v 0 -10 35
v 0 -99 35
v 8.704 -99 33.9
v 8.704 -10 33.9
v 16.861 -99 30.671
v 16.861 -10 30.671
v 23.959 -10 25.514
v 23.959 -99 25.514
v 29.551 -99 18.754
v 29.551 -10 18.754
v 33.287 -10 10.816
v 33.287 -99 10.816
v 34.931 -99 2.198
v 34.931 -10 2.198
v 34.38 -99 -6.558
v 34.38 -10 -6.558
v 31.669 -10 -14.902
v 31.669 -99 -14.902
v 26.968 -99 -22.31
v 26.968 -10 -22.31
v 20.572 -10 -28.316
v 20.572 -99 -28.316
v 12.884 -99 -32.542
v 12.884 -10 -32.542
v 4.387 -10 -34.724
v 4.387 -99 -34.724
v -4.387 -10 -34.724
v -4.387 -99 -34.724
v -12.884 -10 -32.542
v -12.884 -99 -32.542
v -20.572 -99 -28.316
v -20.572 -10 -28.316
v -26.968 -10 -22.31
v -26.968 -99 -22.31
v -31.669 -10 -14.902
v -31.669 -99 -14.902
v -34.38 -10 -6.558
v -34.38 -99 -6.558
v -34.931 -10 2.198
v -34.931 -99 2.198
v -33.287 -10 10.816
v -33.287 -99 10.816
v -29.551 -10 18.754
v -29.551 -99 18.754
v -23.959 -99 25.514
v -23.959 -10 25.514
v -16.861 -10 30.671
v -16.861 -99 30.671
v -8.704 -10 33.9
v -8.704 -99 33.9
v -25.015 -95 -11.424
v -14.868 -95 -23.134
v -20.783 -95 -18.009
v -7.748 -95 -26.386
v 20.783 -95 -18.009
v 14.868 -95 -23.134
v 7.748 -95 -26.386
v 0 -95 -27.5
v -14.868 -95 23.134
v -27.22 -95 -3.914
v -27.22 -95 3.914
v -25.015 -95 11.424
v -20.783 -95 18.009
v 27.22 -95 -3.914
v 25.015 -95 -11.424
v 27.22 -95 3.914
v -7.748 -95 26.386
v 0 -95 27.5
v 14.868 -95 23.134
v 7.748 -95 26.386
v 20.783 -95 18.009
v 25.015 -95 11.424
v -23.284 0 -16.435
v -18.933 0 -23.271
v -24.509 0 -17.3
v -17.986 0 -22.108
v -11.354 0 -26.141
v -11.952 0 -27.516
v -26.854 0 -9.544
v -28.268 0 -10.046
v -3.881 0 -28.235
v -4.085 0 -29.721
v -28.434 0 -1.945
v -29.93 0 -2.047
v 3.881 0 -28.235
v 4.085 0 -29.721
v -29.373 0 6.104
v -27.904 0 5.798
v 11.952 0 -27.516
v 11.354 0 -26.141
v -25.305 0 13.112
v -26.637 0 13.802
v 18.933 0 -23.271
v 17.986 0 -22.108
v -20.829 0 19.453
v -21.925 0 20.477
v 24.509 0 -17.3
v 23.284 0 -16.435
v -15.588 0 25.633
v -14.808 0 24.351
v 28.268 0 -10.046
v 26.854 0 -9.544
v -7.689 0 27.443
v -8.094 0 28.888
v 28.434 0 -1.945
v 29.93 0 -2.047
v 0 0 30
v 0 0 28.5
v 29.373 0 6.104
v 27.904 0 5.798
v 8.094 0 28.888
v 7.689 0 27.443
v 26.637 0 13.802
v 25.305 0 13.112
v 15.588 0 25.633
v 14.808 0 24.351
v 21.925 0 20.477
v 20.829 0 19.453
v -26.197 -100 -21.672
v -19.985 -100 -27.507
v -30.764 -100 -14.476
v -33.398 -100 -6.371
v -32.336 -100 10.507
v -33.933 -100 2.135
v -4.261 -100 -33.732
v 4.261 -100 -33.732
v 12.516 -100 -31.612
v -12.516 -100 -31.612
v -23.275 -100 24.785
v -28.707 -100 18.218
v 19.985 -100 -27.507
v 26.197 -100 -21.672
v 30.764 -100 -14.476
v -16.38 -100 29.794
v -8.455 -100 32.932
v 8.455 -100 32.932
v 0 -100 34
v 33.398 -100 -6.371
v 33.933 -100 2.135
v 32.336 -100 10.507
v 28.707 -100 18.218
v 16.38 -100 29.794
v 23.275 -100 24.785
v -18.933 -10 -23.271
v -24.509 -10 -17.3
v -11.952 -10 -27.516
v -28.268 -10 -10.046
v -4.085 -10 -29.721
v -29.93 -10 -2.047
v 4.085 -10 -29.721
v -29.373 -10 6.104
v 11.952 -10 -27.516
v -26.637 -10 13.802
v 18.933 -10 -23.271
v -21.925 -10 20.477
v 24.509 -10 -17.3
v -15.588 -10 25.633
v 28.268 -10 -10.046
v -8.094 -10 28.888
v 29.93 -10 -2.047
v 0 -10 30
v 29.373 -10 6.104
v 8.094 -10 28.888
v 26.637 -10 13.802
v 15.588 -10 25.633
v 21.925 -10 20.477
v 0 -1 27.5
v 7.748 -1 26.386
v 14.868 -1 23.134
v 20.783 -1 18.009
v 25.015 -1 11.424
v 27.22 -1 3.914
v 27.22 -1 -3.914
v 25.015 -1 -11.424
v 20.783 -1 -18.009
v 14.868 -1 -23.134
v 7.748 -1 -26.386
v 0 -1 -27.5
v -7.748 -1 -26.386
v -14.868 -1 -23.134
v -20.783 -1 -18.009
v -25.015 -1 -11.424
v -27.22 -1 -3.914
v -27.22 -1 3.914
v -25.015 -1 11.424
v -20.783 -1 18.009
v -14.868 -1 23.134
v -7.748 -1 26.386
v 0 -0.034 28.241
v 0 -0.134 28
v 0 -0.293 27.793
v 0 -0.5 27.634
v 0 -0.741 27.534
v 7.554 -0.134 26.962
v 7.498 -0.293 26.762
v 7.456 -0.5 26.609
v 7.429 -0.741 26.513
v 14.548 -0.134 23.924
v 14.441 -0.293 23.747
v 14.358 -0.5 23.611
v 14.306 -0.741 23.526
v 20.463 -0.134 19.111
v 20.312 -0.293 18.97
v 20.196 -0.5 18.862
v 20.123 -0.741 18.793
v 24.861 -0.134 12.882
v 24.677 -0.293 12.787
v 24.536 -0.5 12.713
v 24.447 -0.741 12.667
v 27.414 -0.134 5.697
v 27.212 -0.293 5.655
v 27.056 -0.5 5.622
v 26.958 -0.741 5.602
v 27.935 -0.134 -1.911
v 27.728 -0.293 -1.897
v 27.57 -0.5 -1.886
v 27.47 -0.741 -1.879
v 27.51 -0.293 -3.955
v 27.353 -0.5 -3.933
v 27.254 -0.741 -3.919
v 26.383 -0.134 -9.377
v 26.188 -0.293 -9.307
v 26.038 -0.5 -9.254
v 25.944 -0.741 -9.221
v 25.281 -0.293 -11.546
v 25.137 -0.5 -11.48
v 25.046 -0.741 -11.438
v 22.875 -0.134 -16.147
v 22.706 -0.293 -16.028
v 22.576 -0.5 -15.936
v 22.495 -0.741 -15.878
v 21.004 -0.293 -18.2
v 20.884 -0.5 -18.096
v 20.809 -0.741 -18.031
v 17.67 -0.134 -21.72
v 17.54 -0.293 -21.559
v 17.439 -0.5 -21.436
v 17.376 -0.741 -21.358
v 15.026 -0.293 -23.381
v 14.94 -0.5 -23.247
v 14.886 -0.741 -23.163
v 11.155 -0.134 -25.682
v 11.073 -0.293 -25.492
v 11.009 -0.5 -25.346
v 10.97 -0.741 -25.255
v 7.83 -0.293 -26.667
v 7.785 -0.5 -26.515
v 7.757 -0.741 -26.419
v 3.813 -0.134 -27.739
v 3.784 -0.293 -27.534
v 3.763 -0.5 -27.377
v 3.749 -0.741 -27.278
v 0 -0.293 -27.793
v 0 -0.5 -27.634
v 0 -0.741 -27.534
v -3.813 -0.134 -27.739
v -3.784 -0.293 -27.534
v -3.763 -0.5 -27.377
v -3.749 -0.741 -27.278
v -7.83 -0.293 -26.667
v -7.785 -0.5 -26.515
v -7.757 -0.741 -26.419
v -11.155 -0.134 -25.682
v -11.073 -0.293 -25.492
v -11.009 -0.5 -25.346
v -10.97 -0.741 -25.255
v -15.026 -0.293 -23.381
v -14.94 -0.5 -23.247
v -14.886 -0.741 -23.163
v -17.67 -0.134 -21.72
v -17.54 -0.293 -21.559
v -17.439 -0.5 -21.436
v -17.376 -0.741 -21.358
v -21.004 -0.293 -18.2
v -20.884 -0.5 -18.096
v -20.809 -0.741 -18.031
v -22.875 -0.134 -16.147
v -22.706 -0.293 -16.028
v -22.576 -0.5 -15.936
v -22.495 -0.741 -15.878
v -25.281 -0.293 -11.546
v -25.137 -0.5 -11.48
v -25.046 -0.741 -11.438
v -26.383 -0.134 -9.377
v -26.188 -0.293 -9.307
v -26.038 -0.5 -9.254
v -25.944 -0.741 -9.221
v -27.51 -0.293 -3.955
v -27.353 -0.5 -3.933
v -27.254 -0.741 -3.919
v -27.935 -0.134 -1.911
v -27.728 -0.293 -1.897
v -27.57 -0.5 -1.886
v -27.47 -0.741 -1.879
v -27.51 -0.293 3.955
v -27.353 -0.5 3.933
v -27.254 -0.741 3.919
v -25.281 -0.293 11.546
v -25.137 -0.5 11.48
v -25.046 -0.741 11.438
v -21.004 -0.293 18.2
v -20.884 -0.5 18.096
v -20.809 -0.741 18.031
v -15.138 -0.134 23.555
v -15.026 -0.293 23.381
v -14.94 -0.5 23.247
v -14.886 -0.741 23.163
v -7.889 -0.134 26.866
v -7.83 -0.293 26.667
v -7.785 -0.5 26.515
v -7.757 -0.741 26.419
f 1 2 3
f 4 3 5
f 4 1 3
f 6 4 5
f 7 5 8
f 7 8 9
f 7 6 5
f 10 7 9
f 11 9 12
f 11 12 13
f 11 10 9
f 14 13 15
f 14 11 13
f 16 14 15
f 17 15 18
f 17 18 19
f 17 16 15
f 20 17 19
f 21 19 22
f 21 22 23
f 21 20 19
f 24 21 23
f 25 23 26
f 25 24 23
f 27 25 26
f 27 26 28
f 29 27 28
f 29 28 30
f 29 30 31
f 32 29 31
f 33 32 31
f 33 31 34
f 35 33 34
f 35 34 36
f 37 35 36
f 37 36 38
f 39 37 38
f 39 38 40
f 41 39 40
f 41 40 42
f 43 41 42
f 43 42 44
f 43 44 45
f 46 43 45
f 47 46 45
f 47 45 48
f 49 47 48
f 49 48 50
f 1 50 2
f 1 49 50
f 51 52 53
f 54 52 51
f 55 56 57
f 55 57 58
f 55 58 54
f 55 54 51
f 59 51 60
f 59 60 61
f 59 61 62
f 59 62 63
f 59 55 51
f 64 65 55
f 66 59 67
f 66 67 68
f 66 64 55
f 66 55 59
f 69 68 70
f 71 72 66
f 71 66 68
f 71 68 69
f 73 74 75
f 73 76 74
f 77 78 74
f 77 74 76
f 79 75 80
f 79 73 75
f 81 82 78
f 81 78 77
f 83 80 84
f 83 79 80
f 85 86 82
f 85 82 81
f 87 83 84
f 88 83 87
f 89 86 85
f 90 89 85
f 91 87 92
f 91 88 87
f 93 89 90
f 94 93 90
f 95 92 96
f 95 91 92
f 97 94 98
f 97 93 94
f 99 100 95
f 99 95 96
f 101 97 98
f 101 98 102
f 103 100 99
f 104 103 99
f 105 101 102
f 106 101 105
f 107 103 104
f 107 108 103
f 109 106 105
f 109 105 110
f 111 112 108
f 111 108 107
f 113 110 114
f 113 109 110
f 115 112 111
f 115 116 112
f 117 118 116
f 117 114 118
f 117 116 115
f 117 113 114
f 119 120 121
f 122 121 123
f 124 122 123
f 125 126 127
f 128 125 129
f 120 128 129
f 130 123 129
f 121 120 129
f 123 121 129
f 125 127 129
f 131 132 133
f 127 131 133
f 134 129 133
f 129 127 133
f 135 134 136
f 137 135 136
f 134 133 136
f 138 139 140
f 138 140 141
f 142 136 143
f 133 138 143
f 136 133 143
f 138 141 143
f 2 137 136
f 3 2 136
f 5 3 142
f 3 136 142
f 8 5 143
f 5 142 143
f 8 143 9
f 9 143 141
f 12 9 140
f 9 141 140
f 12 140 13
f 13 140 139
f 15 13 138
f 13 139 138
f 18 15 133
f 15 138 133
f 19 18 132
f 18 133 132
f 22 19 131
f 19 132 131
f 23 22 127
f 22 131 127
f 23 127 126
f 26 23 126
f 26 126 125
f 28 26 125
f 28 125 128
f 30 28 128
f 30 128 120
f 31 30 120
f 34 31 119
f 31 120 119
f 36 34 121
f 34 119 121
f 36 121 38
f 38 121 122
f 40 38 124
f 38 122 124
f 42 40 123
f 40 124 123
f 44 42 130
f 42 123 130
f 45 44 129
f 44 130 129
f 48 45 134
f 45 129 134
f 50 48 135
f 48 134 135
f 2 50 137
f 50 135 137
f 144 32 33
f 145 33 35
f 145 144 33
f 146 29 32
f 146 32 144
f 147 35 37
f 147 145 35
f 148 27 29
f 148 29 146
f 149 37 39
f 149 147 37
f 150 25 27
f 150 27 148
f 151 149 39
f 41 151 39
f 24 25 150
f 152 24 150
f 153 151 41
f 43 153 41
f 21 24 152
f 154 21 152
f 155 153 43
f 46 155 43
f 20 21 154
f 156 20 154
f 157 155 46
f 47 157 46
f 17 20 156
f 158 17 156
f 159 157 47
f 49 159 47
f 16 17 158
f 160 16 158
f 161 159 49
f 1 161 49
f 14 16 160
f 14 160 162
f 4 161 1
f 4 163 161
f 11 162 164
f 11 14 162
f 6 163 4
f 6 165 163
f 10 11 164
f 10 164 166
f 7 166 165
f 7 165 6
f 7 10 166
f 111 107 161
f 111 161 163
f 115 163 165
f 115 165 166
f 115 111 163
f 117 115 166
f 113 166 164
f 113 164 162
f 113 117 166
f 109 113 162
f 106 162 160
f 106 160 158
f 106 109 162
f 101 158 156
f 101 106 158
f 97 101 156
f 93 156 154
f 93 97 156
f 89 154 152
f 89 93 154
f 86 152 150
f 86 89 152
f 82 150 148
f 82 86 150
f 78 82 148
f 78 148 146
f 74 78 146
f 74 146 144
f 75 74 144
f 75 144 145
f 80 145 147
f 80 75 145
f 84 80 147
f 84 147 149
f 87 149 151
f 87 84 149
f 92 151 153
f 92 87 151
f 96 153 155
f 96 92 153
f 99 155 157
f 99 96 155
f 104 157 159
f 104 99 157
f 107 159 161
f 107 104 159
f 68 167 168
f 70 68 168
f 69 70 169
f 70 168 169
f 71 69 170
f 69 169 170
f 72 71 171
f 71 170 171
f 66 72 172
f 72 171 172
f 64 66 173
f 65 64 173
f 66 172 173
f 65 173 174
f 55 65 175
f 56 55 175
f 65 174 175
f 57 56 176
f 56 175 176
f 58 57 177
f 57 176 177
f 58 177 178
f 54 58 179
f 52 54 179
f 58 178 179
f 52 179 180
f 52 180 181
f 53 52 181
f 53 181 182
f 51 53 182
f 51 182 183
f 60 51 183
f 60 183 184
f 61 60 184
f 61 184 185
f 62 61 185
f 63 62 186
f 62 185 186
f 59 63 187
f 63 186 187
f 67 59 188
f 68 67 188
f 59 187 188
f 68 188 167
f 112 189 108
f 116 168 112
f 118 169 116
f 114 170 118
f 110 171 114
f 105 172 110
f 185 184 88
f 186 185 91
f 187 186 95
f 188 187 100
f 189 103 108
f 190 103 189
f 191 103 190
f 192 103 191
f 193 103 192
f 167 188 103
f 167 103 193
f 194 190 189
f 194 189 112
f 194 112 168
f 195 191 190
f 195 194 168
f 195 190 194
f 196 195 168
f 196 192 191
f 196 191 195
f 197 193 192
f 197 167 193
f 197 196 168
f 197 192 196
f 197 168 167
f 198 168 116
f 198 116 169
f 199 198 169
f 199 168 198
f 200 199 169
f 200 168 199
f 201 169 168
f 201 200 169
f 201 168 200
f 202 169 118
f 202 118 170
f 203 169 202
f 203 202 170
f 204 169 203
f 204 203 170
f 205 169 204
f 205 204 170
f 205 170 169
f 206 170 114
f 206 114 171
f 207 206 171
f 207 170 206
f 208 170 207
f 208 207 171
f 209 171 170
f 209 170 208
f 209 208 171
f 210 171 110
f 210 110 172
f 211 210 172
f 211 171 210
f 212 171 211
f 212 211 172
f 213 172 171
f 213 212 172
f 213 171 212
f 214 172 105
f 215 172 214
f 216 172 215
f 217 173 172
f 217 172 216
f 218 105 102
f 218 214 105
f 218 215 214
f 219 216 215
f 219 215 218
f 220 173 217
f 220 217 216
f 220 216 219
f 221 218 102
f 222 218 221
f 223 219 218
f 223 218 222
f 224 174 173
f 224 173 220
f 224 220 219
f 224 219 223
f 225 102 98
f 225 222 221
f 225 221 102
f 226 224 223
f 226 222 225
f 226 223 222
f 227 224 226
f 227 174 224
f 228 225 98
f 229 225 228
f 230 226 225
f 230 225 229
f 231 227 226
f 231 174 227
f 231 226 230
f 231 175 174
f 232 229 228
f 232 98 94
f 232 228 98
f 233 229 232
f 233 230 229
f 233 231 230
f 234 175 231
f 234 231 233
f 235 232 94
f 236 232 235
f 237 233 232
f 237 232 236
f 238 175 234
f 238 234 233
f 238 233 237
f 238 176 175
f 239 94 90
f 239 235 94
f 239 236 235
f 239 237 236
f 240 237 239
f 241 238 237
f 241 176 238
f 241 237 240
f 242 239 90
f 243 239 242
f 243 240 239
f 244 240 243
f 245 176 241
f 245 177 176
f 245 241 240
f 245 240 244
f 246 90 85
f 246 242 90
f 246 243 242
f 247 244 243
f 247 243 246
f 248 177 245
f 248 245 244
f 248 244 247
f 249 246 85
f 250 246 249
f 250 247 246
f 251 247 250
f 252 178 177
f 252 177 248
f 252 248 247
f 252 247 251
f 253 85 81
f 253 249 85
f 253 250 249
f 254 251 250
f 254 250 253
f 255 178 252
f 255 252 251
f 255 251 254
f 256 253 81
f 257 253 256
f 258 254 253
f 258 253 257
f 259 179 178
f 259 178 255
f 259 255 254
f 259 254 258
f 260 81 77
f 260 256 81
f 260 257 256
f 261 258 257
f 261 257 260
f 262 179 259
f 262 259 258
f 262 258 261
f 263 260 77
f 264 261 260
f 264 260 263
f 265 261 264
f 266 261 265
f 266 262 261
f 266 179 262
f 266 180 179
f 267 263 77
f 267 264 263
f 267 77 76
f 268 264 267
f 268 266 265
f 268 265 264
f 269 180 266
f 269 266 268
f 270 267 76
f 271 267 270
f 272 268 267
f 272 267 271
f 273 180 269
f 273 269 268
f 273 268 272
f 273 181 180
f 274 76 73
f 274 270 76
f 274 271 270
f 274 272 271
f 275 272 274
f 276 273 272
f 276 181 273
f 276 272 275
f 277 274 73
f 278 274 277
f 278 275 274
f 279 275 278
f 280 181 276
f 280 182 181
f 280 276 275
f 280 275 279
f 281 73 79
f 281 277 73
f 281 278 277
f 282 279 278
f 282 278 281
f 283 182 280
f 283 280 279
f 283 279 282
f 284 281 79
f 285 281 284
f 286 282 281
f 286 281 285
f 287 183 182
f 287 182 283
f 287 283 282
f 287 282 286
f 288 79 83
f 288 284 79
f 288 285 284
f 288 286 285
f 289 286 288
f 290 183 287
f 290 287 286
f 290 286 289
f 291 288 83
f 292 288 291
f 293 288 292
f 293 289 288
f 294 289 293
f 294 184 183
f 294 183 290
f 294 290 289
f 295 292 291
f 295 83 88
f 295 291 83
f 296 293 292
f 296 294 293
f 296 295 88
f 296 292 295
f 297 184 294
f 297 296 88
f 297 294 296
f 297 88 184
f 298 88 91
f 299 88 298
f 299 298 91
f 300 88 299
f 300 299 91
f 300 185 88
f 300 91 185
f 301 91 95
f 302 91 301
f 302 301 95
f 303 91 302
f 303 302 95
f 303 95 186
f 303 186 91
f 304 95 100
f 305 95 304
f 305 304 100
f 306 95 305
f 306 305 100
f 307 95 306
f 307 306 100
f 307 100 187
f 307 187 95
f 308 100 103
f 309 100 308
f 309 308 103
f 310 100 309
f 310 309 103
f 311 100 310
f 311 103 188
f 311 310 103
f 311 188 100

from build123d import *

# Parameters (mm, degrees)
SKETCH1_R           = 35
BOSS_EXTRUDE1_DEPTH = 100
SKETCH1_3_R         = 35
SKETCH1_3_R_2       = 30
CUT_EXTRUDE1_DEPTH  = 10
SKETCH1_4_R         = 27.5
CUT_EXTRUDE2_DEPTH  = 95
CHAMFER1_SIZE       = 1
FILLET1_R           = 1


with BuildPart() as part:
    # Sketch1 → Boss-Extrude1 (new body)
    with BuildSketch(Plane(origin=(0, 0, 0), x_dir=(1, 0, 0), z_dir=(0, 1, 0))):
        Circle(SKETCH1_R)
    extrude(amount=-BOSS_EXTRUDE1_DEPTH)

    # Sketch1<3> → Cut-Extrude1 (cut)
    with BuildSketch(Plane(origin=(0, 0, 0), x_dir=(1, 0, 0), z_dir=(0, 1, 0))):
        Circle(SKETCH1_3_R)
        Circle(SKETCH1_3_R_2, mode=Mode.SUBTRACT)
    extrude(amount=-CUT_EXTRUDE1_DEPTH, mode=Mode.SUBTRACT)

    # Sketch1<4> → Cut-Extrude2 (cut)
    with BuildSketch(Plane(origin=(0, 0, 0), x_dir=(1, 0, 0), z_dir=(0, 1, 0))):
        Circle(SKETCH1_4_R)
    extrude(amount=-CUT_EXTRUDE2_DEPTH, mode=Mode.SUBTRACT)

    # Chamfer1
    chamfer1_edges = [part.edges().sort_by_distance(p)[0] for p in [
        (-35, -100, 0),
    ]]
    chamfer(chamfer1_edges, length=CHAMFER1_SIZE)

    # Fillet1
    fillet1_edges = [part.edges().sort_by_distance(p)[0] for p in [
        (-27.5, 0, 0),
    ]]
    fillet(fillet1_edges, radius=FILLET1_R)


solid = part.part
